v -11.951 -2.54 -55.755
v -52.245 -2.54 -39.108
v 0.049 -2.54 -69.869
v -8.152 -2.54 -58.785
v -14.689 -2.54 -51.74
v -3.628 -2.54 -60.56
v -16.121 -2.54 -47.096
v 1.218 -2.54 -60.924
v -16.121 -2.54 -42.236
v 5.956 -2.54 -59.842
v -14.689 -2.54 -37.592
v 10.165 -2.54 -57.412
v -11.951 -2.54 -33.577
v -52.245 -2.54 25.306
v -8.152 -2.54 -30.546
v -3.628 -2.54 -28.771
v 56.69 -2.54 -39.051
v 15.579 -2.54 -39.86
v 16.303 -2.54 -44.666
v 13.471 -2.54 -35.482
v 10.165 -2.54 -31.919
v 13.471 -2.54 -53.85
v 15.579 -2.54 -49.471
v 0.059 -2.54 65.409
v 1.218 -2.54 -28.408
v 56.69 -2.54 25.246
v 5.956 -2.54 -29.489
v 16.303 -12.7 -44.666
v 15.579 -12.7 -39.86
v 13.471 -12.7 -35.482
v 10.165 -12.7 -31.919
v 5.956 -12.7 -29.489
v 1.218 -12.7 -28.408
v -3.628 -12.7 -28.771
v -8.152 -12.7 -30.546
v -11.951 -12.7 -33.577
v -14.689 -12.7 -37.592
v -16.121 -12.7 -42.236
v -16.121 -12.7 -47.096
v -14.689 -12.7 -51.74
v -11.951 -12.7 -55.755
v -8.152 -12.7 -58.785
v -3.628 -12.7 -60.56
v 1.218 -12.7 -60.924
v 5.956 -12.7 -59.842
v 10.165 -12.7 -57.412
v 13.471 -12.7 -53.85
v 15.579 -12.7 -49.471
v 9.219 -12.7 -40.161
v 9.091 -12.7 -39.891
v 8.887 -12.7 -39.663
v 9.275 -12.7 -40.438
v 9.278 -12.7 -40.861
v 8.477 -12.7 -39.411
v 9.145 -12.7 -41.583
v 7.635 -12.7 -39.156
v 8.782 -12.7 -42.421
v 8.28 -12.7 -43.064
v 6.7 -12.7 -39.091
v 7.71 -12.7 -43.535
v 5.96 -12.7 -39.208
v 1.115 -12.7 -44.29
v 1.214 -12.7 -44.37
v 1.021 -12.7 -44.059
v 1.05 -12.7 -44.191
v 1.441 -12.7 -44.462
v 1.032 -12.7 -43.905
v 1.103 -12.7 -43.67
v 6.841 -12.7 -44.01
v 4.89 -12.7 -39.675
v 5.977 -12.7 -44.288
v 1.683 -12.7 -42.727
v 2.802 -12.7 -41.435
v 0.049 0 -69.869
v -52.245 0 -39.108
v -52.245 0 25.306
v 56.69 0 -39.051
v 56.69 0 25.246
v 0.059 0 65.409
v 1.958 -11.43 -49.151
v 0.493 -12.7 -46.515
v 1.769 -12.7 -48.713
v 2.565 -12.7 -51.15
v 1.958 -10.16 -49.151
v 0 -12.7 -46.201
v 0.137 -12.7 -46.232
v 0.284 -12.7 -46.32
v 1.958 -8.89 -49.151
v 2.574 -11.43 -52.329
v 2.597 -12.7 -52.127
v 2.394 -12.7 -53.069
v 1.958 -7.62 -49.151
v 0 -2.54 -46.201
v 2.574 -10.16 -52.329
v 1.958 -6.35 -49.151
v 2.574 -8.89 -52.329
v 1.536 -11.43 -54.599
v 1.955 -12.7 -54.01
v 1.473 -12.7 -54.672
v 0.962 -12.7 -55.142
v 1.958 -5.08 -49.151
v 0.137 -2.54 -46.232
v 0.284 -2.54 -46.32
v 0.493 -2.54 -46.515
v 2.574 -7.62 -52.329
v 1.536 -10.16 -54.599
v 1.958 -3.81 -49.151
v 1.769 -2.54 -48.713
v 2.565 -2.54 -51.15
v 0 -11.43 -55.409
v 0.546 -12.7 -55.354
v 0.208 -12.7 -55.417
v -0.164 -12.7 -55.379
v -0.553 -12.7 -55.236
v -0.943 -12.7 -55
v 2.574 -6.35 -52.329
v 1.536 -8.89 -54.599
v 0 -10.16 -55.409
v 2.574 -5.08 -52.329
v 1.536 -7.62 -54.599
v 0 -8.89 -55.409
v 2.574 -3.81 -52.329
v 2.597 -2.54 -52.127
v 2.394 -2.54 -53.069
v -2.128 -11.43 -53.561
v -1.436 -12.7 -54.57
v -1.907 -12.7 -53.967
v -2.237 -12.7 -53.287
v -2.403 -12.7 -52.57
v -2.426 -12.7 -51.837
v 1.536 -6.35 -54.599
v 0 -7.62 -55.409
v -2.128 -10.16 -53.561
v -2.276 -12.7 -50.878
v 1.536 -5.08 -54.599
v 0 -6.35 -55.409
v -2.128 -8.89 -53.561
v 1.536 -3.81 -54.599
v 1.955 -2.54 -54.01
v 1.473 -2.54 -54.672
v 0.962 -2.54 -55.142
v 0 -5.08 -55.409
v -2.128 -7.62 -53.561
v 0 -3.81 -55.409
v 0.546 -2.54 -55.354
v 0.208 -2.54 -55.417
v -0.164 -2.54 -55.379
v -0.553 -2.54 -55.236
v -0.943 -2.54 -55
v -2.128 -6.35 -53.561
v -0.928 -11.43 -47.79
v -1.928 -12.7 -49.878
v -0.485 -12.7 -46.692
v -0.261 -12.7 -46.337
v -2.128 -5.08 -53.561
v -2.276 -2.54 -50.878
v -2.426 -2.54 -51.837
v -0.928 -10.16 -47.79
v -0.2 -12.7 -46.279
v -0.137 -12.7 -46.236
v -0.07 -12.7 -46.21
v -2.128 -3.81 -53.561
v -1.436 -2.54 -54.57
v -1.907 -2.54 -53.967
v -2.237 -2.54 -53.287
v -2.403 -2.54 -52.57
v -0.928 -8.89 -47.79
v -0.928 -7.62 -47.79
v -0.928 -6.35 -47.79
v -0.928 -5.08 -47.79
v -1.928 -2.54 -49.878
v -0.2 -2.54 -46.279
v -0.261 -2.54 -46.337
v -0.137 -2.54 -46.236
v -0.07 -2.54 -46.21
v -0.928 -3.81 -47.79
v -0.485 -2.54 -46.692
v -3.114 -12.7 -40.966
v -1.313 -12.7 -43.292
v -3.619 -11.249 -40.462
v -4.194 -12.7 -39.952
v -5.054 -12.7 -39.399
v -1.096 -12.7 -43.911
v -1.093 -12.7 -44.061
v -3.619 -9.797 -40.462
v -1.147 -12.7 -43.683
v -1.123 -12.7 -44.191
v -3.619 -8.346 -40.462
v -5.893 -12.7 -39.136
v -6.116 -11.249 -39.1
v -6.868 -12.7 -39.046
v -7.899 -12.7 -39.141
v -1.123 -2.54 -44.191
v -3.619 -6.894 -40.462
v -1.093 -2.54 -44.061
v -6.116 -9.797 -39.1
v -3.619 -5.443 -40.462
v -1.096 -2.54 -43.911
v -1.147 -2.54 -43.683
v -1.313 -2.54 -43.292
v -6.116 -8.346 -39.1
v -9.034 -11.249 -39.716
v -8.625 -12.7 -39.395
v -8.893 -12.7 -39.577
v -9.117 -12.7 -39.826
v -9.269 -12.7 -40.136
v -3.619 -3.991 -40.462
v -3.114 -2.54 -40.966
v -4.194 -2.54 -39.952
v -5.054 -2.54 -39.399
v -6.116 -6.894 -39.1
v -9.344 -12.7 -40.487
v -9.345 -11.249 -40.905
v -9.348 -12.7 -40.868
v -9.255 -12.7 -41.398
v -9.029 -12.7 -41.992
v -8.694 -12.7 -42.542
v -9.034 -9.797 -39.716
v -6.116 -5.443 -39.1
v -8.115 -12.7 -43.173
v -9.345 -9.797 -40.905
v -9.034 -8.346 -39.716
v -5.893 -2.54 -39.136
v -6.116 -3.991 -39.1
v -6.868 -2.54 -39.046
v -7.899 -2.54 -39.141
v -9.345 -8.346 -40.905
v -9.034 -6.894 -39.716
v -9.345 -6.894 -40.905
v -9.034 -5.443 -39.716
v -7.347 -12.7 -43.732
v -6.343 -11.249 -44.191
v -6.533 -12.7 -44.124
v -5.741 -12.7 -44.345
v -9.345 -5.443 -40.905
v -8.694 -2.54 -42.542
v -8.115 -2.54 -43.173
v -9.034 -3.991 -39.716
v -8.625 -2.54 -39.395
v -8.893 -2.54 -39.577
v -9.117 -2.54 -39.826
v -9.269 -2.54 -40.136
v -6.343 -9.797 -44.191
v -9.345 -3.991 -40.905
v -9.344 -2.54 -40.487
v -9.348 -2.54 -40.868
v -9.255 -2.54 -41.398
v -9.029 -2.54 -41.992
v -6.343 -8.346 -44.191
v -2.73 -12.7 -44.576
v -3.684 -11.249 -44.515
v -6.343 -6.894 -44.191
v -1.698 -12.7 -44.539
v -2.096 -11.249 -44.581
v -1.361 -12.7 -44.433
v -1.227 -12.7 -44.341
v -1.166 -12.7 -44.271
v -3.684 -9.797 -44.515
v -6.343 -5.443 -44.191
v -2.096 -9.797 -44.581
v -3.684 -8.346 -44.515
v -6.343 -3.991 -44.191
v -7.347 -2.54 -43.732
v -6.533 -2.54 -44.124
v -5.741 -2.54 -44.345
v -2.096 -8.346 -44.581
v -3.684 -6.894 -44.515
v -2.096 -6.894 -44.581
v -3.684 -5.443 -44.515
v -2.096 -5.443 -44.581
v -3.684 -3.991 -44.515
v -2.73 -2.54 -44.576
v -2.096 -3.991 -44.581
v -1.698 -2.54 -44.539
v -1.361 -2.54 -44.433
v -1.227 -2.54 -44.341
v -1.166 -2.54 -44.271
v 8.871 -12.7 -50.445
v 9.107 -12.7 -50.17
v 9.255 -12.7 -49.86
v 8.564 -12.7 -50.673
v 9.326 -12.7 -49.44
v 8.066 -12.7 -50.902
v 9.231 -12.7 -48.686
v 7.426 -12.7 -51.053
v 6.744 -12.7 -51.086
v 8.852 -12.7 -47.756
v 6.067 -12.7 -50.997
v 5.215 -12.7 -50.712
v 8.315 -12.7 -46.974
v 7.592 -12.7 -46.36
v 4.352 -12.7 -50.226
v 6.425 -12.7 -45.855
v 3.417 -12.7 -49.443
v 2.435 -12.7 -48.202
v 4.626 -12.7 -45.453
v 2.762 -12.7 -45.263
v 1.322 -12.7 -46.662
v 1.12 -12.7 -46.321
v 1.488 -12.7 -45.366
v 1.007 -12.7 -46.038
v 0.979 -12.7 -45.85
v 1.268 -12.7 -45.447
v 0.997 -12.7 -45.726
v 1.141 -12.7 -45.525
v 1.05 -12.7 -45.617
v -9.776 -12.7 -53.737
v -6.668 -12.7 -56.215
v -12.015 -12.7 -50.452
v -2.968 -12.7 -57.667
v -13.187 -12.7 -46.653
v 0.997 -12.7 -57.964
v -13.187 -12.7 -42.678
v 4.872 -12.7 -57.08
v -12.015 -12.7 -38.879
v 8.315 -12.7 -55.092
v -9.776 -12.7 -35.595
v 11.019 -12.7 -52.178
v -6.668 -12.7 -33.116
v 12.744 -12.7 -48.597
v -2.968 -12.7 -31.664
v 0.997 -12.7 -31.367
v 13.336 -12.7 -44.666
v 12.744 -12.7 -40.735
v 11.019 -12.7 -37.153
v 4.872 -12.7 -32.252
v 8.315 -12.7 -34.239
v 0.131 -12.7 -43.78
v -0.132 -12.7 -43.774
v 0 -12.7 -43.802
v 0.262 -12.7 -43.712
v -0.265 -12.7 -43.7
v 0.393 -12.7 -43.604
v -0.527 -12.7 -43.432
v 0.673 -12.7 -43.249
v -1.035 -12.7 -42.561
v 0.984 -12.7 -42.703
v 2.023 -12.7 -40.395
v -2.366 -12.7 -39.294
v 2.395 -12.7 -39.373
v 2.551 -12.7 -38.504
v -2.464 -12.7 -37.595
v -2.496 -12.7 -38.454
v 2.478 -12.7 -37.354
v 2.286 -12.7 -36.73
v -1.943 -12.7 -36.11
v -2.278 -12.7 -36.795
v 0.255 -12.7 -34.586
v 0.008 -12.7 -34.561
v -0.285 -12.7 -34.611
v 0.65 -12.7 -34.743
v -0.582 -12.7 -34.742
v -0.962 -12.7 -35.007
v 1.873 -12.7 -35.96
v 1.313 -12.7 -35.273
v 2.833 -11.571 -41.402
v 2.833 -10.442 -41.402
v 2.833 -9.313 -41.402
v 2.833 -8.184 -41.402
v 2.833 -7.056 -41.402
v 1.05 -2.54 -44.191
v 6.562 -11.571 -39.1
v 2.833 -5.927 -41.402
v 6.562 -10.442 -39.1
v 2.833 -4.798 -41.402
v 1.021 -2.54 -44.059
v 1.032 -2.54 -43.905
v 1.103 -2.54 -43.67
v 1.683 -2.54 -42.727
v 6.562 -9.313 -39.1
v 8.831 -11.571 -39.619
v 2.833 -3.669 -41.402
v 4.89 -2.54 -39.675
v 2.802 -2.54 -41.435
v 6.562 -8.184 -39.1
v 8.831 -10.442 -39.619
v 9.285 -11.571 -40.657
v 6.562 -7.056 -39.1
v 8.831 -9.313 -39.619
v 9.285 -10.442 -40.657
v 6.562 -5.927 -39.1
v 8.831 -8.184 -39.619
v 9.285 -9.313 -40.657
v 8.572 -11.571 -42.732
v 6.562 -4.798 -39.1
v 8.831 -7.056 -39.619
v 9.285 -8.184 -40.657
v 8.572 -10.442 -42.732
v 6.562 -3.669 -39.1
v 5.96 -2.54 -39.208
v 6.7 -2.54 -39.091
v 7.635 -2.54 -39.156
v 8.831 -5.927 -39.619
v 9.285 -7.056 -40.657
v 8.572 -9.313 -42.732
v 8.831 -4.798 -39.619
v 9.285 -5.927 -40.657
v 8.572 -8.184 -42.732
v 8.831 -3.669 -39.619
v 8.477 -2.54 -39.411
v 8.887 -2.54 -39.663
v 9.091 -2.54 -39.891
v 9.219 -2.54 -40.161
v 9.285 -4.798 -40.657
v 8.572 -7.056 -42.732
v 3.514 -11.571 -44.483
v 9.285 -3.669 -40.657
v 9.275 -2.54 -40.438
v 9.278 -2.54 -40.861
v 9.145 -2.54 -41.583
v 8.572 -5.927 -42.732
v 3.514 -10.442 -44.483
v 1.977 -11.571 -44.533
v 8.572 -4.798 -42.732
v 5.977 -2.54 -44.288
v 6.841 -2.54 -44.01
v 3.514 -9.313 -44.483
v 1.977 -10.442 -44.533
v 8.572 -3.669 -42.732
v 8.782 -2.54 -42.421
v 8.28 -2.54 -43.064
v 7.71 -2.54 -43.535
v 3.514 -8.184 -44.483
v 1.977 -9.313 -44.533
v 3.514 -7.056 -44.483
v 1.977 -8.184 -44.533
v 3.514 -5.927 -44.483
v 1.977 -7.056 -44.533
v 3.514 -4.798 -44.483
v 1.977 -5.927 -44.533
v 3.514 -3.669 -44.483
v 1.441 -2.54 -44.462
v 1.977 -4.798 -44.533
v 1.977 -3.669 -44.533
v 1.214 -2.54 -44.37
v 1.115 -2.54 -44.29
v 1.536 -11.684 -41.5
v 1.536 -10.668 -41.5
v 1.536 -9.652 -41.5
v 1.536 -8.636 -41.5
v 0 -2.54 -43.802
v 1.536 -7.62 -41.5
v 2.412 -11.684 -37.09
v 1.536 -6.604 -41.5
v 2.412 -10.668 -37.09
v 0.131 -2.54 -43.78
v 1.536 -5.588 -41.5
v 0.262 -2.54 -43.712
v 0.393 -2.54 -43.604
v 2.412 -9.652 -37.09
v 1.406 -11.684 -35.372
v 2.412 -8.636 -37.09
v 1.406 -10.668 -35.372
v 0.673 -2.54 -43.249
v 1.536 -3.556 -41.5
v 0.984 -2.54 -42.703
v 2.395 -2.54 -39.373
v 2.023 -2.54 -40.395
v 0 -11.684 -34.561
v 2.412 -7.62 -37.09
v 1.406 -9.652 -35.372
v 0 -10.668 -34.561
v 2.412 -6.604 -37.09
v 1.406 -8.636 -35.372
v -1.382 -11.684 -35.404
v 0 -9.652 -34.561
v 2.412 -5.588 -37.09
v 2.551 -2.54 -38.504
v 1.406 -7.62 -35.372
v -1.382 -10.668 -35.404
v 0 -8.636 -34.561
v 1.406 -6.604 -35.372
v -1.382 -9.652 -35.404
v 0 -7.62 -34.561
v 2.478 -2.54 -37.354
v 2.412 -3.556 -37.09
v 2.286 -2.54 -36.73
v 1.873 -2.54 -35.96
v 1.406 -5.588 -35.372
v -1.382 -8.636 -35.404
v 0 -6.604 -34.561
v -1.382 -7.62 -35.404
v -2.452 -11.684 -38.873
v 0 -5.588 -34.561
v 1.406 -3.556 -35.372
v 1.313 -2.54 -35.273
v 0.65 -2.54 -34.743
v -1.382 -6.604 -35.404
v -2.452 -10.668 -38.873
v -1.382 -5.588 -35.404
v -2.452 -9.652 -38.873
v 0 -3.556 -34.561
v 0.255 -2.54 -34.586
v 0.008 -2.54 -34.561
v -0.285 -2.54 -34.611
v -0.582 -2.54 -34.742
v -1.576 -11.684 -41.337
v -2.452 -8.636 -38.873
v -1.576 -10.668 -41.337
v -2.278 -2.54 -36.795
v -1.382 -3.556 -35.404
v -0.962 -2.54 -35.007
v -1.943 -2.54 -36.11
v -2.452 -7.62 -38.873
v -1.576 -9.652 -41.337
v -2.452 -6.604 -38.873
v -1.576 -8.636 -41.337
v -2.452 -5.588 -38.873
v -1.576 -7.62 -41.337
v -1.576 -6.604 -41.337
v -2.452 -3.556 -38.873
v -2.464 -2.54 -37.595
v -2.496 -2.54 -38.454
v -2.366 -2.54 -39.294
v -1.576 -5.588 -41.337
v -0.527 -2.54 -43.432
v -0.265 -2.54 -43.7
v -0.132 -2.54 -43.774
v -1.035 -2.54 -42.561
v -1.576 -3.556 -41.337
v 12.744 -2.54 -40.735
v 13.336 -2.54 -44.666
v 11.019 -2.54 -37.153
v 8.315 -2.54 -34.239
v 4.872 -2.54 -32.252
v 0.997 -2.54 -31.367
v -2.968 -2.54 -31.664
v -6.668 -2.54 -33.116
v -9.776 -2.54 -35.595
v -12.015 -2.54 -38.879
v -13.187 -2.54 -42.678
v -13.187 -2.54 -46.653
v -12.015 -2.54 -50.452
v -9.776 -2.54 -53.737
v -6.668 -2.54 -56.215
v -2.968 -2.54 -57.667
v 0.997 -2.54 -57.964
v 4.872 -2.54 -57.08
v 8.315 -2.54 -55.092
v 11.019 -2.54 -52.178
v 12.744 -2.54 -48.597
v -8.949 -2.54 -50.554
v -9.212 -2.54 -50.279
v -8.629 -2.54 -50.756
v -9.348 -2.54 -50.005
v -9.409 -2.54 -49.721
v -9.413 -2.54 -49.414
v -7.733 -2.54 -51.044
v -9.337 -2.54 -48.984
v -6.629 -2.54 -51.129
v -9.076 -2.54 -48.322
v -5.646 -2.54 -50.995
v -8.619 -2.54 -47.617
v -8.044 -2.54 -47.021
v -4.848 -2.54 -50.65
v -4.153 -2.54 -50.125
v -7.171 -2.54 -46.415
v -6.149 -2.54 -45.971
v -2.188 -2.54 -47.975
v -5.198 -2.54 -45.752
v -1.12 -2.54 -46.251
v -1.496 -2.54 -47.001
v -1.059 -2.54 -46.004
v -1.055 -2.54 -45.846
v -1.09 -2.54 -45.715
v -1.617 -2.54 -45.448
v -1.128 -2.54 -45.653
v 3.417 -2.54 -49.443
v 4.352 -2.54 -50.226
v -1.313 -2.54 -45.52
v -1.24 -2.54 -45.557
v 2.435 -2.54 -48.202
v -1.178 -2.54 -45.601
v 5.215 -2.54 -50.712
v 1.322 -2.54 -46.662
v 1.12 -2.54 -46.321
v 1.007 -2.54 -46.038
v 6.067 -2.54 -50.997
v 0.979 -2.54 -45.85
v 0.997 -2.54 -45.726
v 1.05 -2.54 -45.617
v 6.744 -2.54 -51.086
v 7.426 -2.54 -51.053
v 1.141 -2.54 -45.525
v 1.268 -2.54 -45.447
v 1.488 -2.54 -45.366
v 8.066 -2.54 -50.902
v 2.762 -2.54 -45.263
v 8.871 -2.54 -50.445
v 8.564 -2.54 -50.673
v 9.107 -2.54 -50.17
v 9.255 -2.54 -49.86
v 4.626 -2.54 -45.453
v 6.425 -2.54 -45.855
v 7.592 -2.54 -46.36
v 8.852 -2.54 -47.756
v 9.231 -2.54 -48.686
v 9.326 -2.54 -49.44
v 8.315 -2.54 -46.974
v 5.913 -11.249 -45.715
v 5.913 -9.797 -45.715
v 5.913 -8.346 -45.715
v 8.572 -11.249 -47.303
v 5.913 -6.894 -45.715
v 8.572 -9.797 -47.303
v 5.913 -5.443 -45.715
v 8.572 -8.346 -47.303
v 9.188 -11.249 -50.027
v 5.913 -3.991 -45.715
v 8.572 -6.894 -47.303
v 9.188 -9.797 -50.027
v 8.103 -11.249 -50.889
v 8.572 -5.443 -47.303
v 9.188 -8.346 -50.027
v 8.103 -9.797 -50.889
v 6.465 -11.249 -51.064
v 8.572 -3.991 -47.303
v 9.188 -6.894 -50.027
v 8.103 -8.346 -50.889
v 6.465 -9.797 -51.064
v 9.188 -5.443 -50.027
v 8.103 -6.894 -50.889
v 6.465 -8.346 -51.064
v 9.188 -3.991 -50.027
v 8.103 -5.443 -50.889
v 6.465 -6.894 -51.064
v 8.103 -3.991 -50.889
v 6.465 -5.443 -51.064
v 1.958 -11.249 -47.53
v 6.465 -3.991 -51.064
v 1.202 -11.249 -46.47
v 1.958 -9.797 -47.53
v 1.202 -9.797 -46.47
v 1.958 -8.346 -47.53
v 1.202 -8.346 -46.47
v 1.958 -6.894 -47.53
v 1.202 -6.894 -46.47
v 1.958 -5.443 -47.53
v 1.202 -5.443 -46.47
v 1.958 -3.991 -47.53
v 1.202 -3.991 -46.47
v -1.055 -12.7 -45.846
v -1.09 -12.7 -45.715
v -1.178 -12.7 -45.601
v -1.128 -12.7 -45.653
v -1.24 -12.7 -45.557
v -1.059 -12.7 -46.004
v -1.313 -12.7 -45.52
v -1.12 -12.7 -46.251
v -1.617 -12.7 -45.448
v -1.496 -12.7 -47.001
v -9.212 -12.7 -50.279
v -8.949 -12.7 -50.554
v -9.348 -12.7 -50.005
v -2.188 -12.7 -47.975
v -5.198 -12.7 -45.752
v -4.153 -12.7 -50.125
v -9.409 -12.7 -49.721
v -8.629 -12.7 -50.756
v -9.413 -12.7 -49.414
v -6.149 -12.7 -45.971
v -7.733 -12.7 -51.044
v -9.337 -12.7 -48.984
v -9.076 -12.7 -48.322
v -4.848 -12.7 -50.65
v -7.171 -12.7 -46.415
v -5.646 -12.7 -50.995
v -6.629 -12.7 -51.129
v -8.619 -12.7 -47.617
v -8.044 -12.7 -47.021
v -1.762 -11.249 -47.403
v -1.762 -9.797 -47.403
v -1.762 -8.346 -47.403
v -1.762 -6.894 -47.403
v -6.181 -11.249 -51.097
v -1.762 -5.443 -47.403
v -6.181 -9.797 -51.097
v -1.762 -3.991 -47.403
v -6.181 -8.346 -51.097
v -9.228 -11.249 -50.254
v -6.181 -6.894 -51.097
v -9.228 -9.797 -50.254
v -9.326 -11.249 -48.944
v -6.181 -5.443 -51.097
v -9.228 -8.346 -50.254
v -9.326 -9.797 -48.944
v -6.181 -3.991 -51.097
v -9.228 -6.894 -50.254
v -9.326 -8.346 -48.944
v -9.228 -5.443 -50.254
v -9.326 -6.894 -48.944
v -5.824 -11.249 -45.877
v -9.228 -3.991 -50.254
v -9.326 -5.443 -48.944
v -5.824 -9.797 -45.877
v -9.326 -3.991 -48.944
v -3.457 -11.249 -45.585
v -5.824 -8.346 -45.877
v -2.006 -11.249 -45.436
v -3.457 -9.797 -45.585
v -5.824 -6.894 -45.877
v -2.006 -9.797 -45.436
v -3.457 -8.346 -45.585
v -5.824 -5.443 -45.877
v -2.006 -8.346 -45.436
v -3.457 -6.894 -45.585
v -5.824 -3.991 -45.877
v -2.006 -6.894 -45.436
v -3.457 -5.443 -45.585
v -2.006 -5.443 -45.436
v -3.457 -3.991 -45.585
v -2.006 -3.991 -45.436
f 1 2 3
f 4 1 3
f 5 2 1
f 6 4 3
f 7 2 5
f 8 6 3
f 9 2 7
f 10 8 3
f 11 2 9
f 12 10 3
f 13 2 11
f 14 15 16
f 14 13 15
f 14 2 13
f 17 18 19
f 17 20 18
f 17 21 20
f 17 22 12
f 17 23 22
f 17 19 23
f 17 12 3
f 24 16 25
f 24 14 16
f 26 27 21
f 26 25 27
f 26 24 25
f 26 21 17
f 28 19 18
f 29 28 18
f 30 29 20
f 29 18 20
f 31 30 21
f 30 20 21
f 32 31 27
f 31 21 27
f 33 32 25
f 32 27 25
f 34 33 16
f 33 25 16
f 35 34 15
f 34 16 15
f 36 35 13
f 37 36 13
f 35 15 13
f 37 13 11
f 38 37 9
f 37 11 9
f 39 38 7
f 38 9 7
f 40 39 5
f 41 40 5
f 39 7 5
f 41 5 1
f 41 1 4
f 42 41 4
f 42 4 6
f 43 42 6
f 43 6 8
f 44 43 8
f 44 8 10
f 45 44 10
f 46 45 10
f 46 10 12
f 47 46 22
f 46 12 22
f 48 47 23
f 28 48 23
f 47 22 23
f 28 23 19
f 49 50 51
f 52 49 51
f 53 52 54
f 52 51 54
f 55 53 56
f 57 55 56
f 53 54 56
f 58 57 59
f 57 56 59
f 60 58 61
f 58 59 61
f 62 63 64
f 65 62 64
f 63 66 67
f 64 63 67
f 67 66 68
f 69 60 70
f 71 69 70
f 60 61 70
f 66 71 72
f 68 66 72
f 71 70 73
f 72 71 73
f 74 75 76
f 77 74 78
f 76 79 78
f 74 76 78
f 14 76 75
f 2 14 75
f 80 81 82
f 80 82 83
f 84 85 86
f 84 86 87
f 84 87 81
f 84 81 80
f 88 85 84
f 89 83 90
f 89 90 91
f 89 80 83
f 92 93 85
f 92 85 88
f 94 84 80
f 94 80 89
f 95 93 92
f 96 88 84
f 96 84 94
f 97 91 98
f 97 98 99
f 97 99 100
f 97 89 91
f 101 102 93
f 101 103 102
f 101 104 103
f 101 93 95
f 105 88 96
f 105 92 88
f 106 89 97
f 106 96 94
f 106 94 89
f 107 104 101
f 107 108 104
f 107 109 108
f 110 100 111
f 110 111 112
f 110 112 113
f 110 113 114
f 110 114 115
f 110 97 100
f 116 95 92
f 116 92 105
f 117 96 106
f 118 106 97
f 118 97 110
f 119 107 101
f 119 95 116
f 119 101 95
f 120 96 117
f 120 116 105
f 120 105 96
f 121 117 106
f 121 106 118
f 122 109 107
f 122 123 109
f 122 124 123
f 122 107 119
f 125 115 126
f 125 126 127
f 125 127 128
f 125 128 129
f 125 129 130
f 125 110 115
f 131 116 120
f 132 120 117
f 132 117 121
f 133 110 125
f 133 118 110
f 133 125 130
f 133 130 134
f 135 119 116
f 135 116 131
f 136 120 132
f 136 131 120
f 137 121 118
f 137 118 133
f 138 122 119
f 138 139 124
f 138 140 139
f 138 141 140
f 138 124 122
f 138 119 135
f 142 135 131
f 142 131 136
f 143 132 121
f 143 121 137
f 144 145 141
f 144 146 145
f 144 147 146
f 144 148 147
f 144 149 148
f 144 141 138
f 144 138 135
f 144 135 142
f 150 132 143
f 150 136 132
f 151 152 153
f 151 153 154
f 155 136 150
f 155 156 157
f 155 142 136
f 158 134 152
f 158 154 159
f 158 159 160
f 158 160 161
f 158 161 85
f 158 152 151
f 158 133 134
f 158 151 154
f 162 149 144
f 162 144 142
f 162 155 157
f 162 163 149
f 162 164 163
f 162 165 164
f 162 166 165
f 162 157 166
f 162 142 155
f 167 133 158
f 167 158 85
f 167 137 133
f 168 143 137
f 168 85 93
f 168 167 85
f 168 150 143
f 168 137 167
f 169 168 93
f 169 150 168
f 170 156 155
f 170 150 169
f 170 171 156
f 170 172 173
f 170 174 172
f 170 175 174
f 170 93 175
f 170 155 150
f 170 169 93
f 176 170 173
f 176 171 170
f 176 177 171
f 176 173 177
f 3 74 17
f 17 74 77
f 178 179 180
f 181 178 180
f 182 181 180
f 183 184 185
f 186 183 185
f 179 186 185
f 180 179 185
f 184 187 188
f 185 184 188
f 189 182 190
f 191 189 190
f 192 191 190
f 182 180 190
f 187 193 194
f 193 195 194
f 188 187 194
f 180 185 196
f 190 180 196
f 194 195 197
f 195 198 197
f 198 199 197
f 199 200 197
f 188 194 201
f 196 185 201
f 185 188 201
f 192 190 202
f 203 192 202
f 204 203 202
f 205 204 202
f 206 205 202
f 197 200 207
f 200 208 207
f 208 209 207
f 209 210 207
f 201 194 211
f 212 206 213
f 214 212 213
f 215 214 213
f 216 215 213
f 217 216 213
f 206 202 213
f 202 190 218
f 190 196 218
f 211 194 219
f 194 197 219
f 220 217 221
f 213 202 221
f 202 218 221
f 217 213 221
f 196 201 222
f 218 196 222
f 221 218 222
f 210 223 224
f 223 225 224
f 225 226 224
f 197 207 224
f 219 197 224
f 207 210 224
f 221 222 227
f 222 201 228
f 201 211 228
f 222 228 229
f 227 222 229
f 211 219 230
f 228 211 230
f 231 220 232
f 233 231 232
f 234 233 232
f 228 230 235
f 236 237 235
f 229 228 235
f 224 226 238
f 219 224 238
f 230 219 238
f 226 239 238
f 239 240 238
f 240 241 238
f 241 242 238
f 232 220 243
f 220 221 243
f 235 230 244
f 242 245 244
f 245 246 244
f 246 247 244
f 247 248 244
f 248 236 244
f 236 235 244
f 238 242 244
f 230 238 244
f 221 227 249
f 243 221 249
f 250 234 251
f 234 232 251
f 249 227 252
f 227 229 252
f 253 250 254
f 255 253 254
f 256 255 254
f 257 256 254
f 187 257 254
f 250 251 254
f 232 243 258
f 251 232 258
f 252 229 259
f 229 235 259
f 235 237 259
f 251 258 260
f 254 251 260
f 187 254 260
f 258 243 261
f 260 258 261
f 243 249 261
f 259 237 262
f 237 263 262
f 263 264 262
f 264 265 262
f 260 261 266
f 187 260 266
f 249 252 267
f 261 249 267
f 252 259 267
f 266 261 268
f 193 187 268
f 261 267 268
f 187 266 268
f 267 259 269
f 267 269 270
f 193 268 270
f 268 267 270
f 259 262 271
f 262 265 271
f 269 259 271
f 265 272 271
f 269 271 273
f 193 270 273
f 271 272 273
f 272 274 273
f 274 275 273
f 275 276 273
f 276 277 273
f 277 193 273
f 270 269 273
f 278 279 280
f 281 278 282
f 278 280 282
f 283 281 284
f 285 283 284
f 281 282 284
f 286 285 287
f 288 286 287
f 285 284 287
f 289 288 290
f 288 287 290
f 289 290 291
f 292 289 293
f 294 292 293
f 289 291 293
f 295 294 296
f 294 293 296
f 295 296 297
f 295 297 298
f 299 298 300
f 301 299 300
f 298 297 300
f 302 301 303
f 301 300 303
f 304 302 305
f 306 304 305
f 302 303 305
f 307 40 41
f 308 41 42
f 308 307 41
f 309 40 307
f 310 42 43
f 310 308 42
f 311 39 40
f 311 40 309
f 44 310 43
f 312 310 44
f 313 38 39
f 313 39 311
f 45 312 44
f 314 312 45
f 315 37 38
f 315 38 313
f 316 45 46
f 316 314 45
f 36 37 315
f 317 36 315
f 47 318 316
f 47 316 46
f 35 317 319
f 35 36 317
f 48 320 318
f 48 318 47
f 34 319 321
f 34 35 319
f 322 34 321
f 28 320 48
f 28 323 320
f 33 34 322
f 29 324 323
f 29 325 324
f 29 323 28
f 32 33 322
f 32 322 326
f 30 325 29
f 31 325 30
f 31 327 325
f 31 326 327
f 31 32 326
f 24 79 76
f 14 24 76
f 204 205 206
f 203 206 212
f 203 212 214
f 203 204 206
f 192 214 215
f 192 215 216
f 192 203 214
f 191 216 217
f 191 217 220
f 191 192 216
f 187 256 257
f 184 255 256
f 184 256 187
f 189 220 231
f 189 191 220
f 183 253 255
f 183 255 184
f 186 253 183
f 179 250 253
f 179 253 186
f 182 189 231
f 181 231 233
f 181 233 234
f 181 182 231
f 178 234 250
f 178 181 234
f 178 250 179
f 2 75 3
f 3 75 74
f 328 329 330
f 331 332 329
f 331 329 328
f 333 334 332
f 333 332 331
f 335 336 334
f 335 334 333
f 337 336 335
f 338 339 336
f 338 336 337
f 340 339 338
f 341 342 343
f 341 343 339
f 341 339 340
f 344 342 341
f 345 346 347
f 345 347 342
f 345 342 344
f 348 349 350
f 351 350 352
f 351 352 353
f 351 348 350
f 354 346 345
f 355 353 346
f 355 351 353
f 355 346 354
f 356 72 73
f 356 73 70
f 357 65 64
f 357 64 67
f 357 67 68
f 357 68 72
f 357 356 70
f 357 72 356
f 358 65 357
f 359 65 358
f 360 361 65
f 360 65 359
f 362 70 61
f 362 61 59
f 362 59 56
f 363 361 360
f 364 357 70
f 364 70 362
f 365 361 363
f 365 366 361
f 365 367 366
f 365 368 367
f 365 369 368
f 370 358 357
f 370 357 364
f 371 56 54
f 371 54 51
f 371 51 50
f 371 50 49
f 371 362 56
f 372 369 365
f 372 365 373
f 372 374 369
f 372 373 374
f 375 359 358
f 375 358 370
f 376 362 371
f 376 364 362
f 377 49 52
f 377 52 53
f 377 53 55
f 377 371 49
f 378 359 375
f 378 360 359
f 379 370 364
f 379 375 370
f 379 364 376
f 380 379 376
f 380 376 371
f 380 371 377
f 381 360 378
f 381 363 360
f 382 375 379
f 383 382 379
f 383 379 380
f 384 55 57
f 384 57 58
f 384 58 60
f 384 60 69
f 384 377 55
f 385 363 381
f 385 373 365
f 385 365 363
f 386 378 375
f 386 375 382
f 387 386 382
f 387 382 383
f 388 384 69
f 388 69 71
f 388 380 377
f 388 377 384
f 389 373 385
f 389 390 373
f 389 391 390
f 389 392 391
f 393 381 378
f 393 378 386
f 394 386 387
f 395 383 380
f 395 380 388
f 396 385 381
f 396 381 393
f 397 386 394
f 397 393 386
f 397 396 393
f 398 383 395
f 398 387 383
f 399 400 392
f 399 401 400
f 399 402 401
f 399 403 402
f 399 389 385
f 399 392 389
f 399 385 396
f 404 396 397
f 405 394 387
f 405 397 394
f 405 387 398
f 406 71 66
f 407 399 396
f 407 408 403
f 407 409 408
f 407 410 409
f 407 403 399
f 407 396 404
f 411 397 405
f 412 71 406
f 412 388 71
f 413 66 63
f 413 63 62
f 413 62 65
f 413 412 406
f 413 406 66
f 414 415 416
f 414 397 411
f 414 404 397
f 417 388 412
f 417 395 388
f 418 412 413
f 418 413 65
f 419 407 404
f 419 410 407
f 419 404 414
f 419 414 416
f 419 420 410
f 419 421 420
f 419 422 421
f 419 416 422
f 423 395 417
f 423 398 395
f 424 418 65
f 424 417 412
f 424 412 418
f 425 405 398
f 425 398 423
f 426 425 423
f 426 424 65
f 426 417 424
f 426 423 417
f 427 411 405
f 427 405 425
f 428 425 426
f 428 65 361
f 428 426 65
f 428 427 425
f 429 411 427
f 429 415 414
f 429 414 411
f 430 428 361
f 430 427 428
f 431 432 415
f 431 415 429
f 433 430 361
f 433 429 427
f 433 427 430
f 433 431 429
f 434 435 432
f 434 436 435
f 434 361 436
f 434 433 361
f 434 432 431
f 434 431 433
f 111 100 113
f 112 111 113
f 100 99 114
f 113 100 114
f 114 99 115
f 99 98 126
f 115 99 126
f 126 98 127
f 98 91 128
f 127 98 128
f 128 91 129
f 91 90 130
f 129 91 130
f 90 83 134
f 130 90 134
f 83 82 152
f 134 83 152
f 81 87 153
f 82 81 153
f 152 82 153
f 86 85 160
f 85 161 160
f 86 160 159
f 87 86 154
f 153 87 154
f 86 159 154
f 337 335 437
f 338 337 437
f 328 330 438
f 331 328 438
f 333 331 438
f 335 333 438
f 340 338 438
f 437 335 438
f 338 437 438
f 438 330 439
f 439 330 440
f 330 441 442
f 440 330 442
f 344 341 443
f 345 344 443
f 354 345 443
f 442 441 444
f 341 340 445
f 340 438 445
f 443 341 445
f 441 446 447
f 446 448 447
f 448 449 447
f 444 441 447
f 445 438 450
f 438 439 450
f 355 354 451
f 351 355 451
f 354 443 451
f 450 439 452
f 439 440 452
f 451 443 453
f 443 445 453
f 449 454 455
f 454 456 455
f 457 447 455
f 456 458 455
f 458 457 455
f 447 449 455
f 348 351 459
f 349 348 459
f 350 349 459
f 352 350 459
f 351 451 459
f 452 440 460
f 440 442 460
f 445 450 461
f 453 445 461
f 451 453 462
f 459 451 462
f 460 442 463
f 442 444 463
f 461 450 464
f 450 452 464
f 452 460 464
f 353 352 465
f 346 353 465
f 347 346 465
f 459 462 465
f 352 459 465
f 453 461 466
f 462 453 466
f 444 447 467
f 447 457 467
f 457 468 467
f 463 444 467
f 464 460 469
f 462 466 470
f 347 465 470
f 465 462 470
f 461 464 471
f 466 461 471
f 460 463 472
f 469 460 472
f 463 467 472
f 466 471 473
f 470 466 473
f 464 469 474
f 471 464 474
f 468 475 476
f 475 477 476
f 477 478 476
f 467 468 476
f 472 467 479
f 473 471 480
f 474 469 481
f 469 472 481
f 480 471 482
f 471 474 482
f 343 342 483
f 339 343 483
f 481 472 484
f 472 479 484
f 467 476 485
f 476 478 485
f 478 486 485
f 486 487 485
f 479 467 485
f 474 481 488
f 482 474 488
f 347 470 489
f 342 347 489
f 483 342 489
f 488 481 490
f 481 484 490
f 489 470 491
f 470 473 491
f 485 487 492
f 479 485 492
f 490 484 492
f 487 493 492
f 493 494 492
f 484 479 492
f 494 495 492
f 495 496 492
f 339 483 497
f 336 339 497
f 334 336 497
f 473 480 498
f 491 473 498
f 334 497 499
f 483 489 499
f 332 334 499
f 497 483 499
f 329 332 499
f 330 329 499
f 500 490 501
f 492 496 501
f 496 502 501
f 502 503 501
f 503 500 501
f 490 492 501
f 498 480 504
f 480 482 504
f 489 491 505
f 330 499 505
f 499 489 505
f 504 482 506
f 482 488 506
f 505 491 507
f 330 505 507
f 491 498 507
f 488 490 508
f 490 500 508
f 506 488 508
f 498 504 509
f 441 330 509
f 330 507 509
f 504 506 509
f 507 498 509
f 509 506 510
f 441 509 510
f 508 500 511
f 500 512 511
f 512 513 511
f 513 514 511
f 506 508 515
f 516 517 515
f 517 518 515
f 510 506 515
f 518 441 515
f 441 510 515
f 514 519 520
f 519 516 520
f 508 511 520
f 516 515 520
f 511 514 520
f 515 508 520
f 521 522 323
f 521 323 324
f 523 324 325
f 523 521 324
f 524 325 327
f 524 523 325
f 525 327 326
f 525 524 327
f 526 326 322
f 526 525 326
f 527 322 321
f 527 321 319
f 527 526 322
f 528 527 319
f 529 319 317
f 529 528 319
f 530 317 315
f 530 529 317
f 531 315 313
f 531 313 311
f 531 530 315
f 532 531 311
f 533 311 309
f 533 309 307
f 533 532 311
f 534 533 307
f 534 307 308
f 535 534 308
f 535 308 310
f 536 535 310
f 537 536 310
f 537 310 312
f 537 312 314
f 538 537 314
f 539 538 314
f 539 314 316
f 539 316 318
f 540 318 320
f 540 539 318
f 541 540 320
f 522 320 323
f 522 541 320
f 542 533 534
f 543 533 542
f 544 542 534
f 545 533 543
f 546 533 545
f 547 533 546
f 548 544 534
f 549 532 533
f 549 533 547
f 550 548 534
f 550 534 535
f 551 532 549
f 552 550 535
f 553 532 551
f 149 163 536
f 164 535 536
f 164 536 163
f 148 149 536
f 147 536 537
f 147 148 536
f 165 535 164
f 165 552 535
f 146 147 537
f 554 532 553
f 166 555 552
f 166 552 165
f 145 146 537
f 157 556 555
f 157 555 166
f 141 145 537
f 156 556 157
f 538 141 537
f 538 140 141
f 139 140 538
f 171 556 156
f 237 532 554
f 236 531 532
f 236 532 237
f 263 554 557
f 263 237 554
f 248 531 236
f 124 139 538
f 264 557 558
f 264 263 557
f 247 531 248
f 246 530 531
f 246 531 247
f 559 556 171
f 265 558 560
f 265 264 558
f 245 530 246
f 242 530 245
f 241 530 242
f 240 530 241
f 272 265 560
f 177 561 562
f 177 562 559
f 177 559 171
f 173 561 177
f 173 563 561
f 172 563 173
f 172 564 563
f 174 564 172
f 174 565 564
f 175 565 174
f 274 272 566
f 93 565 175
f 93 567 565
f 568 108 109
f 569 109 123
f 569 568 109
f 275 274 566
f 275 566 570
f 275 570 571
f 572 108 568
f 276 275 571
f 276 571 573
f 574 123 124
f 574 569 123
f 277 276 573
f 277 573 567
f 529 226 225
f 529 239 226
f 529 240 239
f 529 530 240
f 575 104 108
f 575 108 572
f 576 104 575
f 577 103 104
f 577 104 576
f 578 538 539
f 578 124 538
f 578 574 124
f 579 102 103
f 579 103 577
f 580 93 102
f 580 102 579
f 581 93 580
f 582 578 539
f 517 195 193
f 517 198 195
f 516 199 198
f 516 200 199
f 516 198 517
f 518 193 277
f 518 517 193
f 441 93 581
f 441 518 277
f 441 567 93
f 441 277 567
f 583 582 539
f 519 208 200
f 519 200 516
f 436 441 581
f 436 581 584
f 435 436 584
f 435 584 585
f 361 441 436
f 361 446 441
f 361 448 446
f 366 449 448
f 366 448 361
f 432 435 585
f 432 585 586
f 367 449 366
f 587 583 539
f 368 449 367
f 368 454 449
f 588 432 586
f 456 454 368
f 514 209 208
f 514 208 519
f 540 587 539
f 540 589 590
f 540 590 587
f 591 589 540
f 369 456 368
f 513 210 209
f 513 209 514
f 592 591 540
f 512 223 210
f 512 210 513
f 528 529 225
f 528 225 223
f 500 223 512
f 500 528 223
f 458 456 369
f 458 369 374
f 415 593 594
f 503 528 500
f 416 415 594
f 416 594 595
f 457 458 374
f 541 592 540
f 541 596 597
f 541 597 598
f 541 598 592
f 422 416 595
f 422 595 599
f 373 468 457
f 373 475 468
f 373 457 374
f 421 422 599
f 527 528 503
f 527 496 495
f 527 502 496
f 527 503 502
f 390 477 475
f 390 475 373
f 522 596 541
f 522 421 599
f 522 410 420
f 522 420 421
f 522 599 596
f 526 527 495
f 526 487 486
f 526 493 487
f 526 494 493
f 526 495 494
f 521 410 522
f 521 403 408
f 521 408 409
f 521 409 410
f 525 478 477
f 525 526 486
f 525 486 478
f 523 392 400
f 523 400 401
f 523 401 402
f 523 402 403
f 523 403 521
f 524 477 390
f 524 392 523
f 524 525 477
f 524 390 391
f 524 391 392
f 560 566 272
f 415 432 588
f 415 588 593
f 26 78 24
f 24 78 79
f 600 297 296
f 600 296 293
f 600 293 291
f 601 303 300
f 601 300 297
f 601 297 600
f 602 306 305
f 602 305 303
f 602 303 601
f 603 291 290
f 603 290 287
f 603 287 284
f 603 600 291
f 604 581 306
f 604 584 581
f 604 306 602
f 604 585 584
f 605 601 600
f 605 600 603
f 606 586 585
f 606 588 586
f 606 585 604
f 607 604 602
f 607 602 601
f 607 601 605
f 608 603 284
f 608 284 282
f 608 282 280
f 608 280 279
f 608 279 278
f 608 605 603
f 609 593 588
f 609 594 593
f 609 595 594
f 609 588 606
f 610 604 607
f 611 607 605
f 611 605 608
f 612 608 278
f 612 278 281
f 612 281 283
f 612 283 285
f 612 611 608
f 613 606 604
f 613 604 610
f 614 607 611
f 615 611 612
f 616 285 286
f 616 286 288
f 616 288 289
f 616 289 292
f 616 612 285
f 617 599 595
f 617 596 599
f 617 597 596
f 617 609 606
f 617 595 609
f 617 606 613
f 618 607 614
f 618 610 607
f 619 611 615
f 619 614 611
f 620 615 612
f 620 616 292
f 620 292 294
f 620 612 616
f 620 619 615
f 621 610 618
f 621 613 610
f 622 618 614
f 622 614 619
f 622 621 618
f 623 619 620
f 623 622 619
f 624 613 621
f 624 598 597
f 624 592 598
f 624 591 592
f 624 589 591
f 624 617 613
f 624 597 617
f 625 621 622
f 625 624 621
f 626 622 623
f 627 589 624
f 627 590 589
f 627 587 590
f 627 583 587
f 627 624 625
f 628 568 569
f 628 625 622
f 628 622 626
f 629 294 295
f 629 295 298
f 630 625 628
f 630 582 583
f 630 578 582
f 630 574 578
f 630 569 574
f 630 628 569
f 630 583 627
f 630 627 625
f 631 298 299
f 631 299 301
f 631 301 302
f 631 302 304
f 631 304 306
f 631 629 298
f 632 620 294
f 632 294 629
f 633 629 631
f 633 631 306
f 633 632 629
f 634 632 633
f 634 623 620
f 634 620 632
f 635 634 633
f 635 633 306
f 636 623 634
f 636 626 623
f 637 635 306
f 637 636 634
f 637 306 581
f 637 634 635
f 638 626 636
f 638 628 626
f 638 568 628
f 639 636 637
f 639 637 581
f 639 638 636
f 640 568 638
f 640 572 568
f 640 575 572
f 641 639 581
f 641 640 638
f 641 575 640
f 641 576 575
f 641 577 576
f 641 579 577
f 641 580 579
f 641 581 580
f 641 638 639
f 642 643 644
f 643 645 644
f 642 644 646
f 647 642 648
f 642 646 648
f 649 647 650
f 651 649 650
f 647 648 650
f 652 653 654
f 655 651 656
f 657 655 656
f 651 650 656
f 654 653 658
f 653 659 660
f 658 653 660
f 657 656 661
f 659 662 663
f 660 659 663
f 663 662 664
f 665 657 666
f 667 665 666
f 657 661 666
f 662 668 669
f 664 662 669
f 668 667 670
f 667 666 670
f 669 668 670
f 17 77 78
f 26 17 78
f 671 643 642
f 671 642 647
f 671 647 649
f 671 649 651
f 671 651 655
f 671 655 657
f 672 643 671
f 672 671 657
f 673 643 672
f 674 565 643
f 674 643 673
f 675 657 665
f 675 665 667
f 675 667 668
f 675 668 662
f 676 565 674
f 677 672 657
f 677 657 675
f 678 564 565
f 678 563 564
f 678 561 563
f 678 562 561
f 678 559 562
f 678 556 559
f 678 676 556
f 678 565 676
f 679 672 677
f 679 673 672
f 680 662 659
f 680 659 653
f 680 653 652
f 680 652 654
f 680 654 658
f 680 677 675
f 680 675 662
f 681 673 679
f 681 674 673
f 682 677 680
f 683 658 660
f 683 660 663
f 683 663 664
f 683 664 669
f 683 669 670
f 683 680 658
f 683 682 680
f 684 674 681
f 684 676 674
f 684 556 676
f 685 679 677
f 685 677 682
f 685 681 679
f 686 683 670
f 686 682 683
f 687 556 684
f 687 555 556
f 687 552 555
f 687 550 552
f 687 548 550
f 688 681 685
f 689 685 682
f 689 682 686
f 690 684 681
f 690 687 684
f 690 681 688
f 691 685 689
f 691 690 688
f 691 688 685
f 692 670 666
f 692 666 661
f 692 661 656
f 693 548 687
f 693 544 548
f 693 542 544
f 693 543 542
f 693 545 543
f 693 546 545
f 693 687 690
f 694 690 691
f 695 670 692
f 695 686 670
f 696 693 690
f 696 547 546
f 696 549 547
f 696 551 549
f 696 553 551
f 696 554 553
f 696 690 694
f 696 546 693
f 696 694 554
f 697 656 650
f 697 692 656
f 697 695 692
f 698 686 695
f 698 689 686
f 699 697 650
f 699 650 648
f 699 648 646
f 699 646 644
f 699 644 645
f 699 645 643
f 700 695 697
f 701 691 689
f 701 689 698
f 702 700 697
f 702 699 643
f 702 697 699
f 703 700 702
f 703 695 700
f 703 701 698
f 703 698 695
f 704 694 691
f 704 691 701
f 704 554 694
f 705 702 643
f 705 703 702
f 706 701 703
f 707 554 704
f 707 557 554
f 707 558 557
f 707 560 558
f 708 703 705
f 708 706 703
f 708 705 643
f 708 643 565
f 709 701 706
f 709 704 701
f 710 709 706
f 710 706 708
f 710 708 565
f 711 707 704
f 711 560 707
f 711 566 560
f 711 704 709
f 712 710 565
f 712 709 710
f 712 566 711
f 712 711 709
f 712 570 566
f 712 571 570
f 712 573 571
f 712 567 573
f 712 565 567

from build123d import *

# Parameters (mm, degrees)
F1_DEPTH  = 12.7
F2_DEPTH  = 2.54
F3_DEPTH  = 7.62
F4_DEPTH  = 2.54
F5_DEPTH  = 2.54
F6_DEPTH  = 2.54
F7_DEPTH  = 2.54
F8_DEPTH  = 2.54
F9_DEPTH  = 2.54
F10_R     = 16.3034877796
F10_R_2   = 13.3360453195
F11_DEPTH = 10.16


with BuildPart() as f1:
    # F0 (on Front) → F1 (new body)
    with BuildSketch(Plane.XZ):
        Polygon((59.2296272516, 26.558874175), (0, 68.5641244054), (-54.7846257687, 26.558874175), (-54.7846257687, -40.5606217682), (0, -72.7868750691), (59.2296272516, -40.5606217682), align=None)
    extrude(amount=F1_DEPTH)

    # F2 (cut): a face of the model
    f2_faces = [f1.faces().sort_by_distance(p)[0] for p in [
        (1.9587071028, -12.7, -4.2659517496),
    ]]
    extrude(f2_faces, amount=-F2_DEPTH, mode=Mode.SUBTRACT)

    # F3 (cut): a face of the model
    f3_faces = [f1.faces().sort_by_distance(p)[0] for p in [
        (1.9587071028, -10.16, -4.2659517496),
    ]]
    extrude(f3_faces, amount=-F3_DEPTH, mode=Mode.SUBTRACT)

    # F4 (cut): a face of the model
    f4_faces = [f1.faces().sort_by_distance(p)[0] for p in [
        (29.6148136258, -1.27, 47.5614992902),
    ]]
    extrude(f4_faces, amount=-F4_DEPTH, mode=Mode.SUBTRACT)

    # F5 (cut): a face of the model
    f5_faces = [f1.faces().sort_by_distance(p)[0] for p in [
        (-27.3923128843, -1.27, 47.5614992902),
    ]]
    extrude(f5_faces, amount=-F5_DEPTH, mode=Mode.SUBTRACT)

    # F6 (cut): a face of the model
    f6_faces = [f1.faces().sort_by_distance(p)[0] for p in [
        (59.2296272516, -1.27, -7.0008737966),
    ]]
    extrude(f6_faces, amount=-F6_DEPTH, mode=Mode.SUBTRACT)

    # F7 (cut): a face of the model
    f7_faces = [f1.faces().sort_by_distance(p)[0] for p in [
        (-54.7846257687, -1.27, -7.0008737966),
    ]]
    extrude(f7_faces, amount=-F7_DEPTH, mode=Mode.SUBTRACT)

    # F8 (cut): a face of the model
    f8_faces = [f1.faces().sort_by_distance(p)[0] for p in [
        (-27.3923128843, -1.27, -56.6737484187),
    ]]
    extrude(f8_faces, amount=-F8_DEPTH, mode=Mode.SUBTRACT)

    # F9 (cut): a face of the model
    f9_faces = [f1.faces().sort_by_distance(p)[0] for p in [
        (29.6148136258, -1.27, -56.6737484187),
    ]]
    extrude(f9_faces, amount=-F9_DEPTH, mode=Mode.SUBTRACT)

    # F10 (on face) → F11 (join)
    with BuildSketch(Plane.XZ.offset(2.54)):
        with Locations((0, -44.6657314897)):
            Circle(F10_R)
        with Locations((0, -44.6657314897)):
            Circle(F10_R_2, mode=Mode.SUBTRACT)
        with BuildLine():
            add(Edge.make_bspline(
                [(1.0498326737, -45.6173457205), (1.4961162946, -44.9933239627), (6.3752970069, -45.5281940166), (8.6683425025, -46.8688306892), (10.0047145229, -50.4438282707), (6.2613687821, -51.6027129589), (3.2399414147, -49.5713098231), (2.1931423362, -47.7164660276), (0.7553893328, -46.0290548727), (1.0498326737, -45.6173457205)],
                knots=[0, 0, 0, 0, 0.1806252712, 0.3247530416, 0.461603616, 0.6014149295, 0.7526073817, 0.880829352, 1, 1, 1, 1], degree=3))
        make_face()
        with BuildLine():
            add(Edge.make_bspline(
                [(0, -43.8016429543), (0.5451229226, -43.8131570736), (1.6167668414, -41.2465516118), (2.6231657093, -39.1701911527), (2.5818193267, -37.0370421169), (1.5416660309, -35.3393119862), (-0.0024608319, -34.1689302246), (-1.4843391474, -35.4003462259), (-2.4438566395, -36.7626925333), (-2.6240611577, -39.0330988064), (-1.6566450487, -41.0723830195), (-0.5604434318, -43.7898052344), (0, -43.8016429543)],
                knots=[0, 0, 0, 0, 0.1131738261, 0.2236560665, 0.3185686351, 0.4145556374, 0.5012327602, 0.5877869581, 0.6762515948, 0.7736337246, 0.8836454589, 1, 1, 1, 1], degree=3))
        make_face()
        with BuildLine():
            add(Edge.make_bspline(
                [(0, -46.2009645998), (0.5449033064, -46.2043986), (2.2391694804, -49.3955928499), (2.913251818, -52.2296052114), (1.7125927192, -54.6676599654), (-0.0390875941, -55.9540920268), (-2.6697391535, -53.6540437741), (-2.3841981624, -50.3430826085), (-0.9051153772, -48.111716018), (-0.3927890289, -46.1984892293), (0, -46.2009645998)],
                knots=[0, 0, 0, 0, 0.1437628495, 0.2812102212, 0.4019001441, 0.5025884397, 0.6308444089, 0.7649326983, 0.8963697423, 1, 1, 1, 1], degree=3))
        make_face()
        with BuildLine():
            add(Edge.make_bspline(
                [(-1.1225264752, -44.190723449), (-0.8397605595, -43.4770525622), (-3.7650692565, -40.0333889851), (-5.7759465771, -38.8708376154), (-9.7332792959, -39.146556477), (-9.2133913348, -42.6379393659), (-6.321842505, -44.4924024313), (-3.989958041, -44.426861801), (-1.337013774, -44.7320664193), (-1.1225264752, -44.190723449)],
                knots=[0, 0, 0, 0, 0.1742353804, 0.312941422, 0.4549867189, 0.5867574934, 0.7332254937, 0.8678367016, 1, 1, 1, 1], degree=3))
        make_face()
        with BuildLine():
            add(Edge.make_bspline(
                [(-1.0901030619, -45.7146167755), (-0.7871291024, -46.3547699821), (-3.6909581852, -49.9336816274), (-5.7762006099, -51.4446574823), (-10.1453199667, -50.7941282402), (-8.796073409, -47.1225897259), (-5.7993611429, -45.6570521825), (-3.7421433013, -45.7075527769), (-1.3098506765, -45.2503123832), (-1.0901030619, -45.7146167755)],
                knots=[0, 0, 0, 0, 0.173918891, 0.3181094664, 0.4638051333, 0.6010830486, 0.7473308021, 0.8738562829, 1, 1, 1, 1], degree=3))
        make_face()
        with BuildLine():
            add(Edge.make_bspline(
                [(1.0498326737, -44.190723449), (0.8182427943, -43.6442024691), (2.9747356408, -41.1491268402), (4.4899562645, -39.8311313876), (6.4602047226, -38.8263537146), (9.0141733888, -39.3962484284), (9.4404359278, -40.6851601484), (8.8268794972, -42.9971078704), (6.1901412499, -44.4984625173), (3.8131014304, -44.3962642702), (1.2503541919, -44.6639272731), (1.0498326737, -44.190723449)],
                knots=[0, 0, 0, 0, 0.1321573784, 0.243914584, 0.3487662065, 0.4596051304, 0.536909385, 0.6445139077, 0.7654190173, 0.8855718643, 1, 1, 1, 1], degree=3))
        make_face()
    extrude(amount=F11_DEPTH)


solid = f1.part
